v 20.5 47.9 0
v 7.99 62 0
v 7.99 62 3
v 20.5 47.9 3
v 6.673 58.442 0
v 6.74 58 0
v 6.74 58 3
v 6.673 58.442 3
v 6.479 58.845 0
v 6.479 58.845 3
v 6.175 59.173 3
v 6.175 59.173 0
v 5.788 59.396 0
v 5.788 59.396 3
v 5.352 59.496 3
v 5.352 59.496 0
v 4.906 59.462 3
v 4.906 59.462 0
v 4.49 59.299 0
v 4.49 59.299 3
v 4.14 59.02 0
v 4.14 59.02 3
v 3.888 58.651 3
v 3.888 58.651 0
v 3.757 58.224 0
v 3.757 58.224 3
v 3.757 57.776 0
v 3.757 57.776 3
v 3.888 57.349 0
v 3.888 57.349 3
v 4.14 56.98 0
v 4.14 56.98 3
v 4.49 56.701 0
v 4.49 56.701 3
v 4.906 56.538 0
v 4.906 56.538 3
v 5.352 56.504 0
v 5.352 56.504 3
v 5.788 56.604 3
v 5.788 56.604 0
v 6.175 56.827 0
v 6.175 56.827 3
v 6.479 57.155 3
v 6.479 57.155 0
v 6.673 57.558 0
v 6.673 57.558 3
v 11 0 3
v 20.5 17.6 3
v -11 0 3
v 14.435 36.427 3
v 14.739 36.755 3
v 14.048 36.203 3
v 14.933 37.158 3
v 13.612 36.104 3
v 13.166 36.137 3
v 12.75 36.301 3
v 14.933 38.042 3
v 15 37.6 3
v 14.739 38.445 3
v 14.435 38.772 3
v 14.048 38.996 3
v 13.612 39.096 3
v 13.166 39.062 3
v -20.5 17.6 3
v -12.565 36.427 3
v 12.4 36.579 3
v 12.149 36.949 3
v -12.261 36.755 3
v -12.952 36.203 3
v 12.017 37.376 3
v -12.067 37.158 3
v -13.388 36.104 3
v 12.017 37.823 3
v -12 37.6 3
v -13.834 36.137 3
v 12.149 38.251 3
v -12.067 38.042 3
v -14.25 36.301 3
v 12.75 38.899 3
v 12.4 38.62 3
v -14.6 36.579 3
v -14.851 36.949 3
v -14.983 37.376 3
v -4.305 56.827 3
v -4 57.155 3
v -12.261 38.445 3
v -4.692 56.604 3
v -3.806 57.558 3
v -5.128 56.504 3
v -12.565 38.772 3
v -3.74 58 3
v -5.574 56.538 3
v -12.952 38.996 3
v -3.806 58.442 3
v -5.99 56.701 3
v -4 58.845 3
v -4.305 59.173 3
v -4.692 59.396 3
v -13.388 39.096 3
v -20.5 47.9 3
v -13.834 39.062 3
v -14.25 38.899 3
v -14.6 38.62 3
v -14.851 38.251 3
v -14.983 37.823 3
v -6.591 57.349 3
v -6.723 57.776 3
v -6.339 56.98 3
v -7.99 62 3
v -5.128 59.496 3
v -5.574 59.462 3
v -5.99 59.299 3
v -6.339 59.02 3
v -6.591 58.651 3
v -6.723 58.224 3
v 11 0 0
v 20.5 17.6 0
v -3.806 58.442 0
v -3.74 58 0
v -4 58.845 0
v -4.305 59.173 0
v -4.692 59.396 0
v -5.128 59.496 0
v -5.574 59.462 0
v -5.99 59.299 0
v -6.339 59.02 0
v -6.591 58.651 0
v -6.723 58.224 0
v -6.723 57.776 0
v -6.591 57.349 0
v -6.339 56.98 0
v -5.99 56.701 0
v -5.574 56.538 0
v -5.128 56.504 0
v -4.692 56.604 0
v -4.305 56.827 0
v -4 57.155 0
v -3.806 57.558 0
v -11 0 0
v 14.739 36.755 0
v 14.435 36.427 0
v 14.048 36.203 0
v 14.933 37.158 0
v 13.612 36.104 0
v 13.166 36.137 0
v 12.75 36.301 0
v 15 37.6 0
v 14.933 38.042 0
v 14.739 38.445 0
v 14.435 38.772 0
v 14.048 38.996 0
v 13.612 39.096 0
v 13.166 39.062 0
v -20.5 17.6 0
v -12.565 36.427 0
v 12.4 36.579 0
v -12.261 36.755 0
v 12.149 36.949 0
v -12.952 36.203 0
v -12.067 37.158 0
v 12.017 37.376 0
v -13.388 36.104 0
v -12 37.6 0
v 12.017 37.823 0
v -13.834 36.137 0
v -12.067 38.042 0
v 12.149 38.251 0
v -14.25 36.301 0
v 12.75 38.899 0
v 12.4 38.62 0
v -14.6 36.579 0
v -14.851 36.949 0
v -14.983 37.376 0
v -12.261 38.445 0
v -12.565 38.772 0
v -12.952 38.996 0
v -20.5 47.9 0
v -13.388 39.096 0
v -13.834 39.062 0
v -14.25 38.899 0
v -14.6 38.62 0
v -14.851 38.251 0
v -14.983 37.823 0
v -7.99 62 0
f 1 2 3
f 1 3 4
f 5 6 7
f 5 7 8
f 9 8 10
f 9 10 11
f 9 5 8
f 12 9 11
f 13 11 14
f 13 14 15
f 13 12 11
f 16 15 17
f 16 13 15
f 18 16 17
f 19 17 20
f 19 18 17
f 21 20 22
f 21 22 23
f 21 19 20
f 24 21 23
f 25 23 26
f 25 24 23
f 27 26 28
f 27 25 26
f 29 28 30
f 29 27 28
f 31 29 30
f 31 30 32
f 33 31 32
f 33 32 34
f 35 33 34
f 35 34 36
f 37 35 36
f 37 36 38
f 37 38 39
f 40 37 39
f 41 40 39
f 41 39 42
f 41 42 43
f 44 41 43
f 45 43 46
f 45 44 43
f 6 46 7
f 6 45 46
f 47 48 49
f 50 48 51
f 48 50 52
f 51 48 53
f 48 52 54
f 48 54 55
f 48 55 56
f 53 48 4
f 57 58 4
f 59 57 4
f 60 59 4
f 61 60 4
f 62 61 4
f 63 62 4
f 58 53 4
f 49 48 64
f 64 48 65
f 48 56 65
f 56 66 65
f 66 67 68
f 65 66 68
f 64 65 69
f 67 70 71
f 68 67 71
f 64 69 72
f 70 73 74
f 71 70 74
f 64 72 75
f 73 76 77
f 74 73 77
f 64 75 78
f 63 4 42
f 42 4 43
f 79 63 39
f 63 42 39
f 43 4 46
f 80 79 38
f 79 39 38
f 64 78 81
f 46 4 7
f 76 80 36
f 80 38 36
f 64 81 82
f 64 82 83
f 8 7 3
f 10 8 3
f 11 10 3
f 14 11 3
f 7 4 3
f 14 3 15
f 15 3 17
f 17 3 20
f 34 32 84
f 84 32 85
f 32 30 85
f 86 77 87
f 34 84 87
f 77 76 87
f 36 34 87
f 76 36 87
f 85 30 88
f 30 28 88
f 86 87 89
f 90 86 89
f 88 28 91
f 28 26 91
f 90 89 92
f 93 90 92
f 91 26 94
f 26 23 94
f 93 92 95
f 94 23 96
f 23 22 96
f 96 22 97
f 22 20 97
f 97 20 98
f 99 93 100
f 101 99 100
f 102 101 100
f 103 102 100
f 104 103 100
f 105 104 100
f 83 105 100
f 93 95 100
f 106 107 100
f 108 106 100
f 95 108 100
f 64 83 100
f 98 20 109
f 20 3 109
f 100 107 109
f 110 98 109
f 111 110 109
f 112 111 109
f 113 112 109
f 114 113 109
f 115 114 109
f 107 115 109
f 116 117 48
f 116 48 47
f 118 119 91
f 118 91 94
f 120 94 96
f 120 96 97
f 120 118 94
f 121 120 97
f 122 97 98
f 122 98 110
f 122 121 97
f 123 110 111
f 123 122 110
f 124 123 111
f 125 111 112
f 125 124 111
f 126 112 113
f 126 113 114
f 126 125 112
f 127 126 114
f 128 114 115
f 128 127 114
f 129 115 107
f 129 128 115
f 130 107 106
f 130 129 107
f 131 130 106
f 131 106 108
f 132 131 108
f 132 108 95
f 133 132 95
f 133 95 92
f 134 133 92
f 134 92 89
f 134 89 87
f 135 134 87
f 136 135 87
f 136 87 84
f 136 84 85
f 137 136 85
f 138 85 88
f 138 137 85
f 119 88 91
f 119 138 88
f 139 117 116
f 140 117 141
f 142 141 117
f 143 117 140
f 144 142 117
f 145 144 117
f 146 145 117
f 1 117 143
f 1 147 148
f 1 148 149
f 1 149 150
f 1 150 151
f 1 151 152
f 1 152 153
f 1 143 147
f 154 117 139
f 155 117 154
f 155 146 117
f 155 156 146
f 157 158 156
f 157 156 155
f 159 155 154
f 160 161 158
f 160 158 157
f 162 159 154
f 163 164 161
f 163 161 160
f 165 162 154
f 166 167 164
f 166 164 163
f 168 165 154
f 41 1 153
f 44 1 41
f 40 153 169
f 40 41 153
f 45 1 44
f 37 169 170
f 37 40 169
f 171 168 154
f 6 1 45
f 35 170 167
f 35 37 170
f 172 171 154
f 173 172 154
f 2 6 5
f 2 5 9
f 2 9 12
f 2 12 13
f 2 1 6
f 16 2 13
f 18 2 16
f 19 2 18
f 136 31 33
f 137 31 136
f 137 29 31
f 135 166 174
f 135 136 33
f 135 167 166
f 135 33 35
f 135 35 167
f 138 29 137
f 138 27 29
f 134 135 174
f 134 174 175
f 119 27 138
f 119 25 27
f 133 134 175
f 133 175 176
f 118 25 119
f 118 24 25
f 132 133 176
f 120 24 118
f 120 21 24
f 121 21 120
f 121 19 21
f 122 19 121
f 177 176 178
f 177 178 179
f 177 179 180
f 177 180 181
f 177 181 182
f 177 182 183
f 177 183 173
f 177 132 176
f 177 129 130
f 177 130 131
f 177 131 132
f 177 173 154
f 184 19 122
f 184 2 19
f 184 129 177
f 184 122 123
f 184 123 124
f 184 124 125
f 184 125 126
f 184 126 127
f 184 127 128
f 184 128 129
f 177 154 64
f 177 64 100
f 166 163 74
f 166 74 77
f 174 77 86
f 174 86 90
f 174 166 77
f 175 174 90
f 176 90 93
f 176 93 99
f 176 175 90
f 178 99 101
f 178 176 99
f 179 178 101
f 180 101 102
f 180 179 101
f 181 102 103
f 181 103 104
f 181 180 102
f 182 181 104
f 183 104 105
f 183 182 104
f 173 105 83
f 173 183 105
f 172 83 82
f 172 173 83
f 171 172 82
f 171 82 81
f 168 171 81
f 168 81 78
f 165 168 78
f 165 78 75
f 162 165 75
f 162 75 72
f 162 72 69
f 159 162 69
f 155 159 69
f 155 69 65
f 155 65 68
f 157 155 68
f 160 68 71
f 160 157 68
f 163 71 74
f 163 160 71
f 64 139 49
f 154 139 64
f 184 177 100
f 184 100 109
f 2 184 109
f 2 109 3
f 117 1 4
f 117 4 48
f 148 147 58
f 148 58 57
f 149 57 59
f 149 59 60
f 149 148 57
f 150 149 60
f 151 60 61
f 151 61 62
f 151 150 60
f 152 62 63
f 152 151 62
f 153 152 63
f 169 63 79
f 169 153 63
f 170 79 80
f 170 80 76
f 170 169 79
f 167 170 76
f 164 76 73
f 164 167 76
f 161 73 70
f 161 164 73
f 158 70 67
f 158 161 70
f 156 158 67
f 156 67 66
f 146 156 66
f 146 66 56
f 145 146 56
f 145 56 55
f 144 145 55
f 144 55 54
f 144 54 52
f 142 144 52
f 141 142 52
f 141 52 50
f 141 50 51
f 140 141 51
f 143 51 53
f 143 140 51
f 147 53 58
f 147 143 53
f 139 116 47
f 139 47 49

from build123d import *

# Parameters (mm, degrees)
SKETCH_1_R      = 1.5
EXTRUDE_1_DEPTH = 3


with BuildPart() as part:
    # 草图1 → 凸台-拉伸1 (new body)
    with BuildSketch(Plane.XY):
        Polygon((11, 0), (-11, 0), (-20.5, 17.599715907), (-20.5, 47.899715907), (-7.989824602, 62), (7.989824602, 62), (20.5, 47.899715907), (20.5, 17.599715907), align=None)
        with Locations((-5.239824602, 58)):
            Circle(SKETCH_1_R, mode=Mode.SUBTRACT)
        with Locations((-13.5, 37.599715907)):
            Circle(SKETCH_1_R, mode=Mode.SUBTRACT)
        with Locations((13.5, 37.599715907)):
            Circle(SKETCH_1_R, mode=Mode.SUBTRACT)
        with Locations((5.239824602, 58)):
            Circle(SKETCH_1_R, mode=Mode.SUBTRACT)
    extrude(amount=EXTRUDE_1_DEPTH)


solid = part.part
